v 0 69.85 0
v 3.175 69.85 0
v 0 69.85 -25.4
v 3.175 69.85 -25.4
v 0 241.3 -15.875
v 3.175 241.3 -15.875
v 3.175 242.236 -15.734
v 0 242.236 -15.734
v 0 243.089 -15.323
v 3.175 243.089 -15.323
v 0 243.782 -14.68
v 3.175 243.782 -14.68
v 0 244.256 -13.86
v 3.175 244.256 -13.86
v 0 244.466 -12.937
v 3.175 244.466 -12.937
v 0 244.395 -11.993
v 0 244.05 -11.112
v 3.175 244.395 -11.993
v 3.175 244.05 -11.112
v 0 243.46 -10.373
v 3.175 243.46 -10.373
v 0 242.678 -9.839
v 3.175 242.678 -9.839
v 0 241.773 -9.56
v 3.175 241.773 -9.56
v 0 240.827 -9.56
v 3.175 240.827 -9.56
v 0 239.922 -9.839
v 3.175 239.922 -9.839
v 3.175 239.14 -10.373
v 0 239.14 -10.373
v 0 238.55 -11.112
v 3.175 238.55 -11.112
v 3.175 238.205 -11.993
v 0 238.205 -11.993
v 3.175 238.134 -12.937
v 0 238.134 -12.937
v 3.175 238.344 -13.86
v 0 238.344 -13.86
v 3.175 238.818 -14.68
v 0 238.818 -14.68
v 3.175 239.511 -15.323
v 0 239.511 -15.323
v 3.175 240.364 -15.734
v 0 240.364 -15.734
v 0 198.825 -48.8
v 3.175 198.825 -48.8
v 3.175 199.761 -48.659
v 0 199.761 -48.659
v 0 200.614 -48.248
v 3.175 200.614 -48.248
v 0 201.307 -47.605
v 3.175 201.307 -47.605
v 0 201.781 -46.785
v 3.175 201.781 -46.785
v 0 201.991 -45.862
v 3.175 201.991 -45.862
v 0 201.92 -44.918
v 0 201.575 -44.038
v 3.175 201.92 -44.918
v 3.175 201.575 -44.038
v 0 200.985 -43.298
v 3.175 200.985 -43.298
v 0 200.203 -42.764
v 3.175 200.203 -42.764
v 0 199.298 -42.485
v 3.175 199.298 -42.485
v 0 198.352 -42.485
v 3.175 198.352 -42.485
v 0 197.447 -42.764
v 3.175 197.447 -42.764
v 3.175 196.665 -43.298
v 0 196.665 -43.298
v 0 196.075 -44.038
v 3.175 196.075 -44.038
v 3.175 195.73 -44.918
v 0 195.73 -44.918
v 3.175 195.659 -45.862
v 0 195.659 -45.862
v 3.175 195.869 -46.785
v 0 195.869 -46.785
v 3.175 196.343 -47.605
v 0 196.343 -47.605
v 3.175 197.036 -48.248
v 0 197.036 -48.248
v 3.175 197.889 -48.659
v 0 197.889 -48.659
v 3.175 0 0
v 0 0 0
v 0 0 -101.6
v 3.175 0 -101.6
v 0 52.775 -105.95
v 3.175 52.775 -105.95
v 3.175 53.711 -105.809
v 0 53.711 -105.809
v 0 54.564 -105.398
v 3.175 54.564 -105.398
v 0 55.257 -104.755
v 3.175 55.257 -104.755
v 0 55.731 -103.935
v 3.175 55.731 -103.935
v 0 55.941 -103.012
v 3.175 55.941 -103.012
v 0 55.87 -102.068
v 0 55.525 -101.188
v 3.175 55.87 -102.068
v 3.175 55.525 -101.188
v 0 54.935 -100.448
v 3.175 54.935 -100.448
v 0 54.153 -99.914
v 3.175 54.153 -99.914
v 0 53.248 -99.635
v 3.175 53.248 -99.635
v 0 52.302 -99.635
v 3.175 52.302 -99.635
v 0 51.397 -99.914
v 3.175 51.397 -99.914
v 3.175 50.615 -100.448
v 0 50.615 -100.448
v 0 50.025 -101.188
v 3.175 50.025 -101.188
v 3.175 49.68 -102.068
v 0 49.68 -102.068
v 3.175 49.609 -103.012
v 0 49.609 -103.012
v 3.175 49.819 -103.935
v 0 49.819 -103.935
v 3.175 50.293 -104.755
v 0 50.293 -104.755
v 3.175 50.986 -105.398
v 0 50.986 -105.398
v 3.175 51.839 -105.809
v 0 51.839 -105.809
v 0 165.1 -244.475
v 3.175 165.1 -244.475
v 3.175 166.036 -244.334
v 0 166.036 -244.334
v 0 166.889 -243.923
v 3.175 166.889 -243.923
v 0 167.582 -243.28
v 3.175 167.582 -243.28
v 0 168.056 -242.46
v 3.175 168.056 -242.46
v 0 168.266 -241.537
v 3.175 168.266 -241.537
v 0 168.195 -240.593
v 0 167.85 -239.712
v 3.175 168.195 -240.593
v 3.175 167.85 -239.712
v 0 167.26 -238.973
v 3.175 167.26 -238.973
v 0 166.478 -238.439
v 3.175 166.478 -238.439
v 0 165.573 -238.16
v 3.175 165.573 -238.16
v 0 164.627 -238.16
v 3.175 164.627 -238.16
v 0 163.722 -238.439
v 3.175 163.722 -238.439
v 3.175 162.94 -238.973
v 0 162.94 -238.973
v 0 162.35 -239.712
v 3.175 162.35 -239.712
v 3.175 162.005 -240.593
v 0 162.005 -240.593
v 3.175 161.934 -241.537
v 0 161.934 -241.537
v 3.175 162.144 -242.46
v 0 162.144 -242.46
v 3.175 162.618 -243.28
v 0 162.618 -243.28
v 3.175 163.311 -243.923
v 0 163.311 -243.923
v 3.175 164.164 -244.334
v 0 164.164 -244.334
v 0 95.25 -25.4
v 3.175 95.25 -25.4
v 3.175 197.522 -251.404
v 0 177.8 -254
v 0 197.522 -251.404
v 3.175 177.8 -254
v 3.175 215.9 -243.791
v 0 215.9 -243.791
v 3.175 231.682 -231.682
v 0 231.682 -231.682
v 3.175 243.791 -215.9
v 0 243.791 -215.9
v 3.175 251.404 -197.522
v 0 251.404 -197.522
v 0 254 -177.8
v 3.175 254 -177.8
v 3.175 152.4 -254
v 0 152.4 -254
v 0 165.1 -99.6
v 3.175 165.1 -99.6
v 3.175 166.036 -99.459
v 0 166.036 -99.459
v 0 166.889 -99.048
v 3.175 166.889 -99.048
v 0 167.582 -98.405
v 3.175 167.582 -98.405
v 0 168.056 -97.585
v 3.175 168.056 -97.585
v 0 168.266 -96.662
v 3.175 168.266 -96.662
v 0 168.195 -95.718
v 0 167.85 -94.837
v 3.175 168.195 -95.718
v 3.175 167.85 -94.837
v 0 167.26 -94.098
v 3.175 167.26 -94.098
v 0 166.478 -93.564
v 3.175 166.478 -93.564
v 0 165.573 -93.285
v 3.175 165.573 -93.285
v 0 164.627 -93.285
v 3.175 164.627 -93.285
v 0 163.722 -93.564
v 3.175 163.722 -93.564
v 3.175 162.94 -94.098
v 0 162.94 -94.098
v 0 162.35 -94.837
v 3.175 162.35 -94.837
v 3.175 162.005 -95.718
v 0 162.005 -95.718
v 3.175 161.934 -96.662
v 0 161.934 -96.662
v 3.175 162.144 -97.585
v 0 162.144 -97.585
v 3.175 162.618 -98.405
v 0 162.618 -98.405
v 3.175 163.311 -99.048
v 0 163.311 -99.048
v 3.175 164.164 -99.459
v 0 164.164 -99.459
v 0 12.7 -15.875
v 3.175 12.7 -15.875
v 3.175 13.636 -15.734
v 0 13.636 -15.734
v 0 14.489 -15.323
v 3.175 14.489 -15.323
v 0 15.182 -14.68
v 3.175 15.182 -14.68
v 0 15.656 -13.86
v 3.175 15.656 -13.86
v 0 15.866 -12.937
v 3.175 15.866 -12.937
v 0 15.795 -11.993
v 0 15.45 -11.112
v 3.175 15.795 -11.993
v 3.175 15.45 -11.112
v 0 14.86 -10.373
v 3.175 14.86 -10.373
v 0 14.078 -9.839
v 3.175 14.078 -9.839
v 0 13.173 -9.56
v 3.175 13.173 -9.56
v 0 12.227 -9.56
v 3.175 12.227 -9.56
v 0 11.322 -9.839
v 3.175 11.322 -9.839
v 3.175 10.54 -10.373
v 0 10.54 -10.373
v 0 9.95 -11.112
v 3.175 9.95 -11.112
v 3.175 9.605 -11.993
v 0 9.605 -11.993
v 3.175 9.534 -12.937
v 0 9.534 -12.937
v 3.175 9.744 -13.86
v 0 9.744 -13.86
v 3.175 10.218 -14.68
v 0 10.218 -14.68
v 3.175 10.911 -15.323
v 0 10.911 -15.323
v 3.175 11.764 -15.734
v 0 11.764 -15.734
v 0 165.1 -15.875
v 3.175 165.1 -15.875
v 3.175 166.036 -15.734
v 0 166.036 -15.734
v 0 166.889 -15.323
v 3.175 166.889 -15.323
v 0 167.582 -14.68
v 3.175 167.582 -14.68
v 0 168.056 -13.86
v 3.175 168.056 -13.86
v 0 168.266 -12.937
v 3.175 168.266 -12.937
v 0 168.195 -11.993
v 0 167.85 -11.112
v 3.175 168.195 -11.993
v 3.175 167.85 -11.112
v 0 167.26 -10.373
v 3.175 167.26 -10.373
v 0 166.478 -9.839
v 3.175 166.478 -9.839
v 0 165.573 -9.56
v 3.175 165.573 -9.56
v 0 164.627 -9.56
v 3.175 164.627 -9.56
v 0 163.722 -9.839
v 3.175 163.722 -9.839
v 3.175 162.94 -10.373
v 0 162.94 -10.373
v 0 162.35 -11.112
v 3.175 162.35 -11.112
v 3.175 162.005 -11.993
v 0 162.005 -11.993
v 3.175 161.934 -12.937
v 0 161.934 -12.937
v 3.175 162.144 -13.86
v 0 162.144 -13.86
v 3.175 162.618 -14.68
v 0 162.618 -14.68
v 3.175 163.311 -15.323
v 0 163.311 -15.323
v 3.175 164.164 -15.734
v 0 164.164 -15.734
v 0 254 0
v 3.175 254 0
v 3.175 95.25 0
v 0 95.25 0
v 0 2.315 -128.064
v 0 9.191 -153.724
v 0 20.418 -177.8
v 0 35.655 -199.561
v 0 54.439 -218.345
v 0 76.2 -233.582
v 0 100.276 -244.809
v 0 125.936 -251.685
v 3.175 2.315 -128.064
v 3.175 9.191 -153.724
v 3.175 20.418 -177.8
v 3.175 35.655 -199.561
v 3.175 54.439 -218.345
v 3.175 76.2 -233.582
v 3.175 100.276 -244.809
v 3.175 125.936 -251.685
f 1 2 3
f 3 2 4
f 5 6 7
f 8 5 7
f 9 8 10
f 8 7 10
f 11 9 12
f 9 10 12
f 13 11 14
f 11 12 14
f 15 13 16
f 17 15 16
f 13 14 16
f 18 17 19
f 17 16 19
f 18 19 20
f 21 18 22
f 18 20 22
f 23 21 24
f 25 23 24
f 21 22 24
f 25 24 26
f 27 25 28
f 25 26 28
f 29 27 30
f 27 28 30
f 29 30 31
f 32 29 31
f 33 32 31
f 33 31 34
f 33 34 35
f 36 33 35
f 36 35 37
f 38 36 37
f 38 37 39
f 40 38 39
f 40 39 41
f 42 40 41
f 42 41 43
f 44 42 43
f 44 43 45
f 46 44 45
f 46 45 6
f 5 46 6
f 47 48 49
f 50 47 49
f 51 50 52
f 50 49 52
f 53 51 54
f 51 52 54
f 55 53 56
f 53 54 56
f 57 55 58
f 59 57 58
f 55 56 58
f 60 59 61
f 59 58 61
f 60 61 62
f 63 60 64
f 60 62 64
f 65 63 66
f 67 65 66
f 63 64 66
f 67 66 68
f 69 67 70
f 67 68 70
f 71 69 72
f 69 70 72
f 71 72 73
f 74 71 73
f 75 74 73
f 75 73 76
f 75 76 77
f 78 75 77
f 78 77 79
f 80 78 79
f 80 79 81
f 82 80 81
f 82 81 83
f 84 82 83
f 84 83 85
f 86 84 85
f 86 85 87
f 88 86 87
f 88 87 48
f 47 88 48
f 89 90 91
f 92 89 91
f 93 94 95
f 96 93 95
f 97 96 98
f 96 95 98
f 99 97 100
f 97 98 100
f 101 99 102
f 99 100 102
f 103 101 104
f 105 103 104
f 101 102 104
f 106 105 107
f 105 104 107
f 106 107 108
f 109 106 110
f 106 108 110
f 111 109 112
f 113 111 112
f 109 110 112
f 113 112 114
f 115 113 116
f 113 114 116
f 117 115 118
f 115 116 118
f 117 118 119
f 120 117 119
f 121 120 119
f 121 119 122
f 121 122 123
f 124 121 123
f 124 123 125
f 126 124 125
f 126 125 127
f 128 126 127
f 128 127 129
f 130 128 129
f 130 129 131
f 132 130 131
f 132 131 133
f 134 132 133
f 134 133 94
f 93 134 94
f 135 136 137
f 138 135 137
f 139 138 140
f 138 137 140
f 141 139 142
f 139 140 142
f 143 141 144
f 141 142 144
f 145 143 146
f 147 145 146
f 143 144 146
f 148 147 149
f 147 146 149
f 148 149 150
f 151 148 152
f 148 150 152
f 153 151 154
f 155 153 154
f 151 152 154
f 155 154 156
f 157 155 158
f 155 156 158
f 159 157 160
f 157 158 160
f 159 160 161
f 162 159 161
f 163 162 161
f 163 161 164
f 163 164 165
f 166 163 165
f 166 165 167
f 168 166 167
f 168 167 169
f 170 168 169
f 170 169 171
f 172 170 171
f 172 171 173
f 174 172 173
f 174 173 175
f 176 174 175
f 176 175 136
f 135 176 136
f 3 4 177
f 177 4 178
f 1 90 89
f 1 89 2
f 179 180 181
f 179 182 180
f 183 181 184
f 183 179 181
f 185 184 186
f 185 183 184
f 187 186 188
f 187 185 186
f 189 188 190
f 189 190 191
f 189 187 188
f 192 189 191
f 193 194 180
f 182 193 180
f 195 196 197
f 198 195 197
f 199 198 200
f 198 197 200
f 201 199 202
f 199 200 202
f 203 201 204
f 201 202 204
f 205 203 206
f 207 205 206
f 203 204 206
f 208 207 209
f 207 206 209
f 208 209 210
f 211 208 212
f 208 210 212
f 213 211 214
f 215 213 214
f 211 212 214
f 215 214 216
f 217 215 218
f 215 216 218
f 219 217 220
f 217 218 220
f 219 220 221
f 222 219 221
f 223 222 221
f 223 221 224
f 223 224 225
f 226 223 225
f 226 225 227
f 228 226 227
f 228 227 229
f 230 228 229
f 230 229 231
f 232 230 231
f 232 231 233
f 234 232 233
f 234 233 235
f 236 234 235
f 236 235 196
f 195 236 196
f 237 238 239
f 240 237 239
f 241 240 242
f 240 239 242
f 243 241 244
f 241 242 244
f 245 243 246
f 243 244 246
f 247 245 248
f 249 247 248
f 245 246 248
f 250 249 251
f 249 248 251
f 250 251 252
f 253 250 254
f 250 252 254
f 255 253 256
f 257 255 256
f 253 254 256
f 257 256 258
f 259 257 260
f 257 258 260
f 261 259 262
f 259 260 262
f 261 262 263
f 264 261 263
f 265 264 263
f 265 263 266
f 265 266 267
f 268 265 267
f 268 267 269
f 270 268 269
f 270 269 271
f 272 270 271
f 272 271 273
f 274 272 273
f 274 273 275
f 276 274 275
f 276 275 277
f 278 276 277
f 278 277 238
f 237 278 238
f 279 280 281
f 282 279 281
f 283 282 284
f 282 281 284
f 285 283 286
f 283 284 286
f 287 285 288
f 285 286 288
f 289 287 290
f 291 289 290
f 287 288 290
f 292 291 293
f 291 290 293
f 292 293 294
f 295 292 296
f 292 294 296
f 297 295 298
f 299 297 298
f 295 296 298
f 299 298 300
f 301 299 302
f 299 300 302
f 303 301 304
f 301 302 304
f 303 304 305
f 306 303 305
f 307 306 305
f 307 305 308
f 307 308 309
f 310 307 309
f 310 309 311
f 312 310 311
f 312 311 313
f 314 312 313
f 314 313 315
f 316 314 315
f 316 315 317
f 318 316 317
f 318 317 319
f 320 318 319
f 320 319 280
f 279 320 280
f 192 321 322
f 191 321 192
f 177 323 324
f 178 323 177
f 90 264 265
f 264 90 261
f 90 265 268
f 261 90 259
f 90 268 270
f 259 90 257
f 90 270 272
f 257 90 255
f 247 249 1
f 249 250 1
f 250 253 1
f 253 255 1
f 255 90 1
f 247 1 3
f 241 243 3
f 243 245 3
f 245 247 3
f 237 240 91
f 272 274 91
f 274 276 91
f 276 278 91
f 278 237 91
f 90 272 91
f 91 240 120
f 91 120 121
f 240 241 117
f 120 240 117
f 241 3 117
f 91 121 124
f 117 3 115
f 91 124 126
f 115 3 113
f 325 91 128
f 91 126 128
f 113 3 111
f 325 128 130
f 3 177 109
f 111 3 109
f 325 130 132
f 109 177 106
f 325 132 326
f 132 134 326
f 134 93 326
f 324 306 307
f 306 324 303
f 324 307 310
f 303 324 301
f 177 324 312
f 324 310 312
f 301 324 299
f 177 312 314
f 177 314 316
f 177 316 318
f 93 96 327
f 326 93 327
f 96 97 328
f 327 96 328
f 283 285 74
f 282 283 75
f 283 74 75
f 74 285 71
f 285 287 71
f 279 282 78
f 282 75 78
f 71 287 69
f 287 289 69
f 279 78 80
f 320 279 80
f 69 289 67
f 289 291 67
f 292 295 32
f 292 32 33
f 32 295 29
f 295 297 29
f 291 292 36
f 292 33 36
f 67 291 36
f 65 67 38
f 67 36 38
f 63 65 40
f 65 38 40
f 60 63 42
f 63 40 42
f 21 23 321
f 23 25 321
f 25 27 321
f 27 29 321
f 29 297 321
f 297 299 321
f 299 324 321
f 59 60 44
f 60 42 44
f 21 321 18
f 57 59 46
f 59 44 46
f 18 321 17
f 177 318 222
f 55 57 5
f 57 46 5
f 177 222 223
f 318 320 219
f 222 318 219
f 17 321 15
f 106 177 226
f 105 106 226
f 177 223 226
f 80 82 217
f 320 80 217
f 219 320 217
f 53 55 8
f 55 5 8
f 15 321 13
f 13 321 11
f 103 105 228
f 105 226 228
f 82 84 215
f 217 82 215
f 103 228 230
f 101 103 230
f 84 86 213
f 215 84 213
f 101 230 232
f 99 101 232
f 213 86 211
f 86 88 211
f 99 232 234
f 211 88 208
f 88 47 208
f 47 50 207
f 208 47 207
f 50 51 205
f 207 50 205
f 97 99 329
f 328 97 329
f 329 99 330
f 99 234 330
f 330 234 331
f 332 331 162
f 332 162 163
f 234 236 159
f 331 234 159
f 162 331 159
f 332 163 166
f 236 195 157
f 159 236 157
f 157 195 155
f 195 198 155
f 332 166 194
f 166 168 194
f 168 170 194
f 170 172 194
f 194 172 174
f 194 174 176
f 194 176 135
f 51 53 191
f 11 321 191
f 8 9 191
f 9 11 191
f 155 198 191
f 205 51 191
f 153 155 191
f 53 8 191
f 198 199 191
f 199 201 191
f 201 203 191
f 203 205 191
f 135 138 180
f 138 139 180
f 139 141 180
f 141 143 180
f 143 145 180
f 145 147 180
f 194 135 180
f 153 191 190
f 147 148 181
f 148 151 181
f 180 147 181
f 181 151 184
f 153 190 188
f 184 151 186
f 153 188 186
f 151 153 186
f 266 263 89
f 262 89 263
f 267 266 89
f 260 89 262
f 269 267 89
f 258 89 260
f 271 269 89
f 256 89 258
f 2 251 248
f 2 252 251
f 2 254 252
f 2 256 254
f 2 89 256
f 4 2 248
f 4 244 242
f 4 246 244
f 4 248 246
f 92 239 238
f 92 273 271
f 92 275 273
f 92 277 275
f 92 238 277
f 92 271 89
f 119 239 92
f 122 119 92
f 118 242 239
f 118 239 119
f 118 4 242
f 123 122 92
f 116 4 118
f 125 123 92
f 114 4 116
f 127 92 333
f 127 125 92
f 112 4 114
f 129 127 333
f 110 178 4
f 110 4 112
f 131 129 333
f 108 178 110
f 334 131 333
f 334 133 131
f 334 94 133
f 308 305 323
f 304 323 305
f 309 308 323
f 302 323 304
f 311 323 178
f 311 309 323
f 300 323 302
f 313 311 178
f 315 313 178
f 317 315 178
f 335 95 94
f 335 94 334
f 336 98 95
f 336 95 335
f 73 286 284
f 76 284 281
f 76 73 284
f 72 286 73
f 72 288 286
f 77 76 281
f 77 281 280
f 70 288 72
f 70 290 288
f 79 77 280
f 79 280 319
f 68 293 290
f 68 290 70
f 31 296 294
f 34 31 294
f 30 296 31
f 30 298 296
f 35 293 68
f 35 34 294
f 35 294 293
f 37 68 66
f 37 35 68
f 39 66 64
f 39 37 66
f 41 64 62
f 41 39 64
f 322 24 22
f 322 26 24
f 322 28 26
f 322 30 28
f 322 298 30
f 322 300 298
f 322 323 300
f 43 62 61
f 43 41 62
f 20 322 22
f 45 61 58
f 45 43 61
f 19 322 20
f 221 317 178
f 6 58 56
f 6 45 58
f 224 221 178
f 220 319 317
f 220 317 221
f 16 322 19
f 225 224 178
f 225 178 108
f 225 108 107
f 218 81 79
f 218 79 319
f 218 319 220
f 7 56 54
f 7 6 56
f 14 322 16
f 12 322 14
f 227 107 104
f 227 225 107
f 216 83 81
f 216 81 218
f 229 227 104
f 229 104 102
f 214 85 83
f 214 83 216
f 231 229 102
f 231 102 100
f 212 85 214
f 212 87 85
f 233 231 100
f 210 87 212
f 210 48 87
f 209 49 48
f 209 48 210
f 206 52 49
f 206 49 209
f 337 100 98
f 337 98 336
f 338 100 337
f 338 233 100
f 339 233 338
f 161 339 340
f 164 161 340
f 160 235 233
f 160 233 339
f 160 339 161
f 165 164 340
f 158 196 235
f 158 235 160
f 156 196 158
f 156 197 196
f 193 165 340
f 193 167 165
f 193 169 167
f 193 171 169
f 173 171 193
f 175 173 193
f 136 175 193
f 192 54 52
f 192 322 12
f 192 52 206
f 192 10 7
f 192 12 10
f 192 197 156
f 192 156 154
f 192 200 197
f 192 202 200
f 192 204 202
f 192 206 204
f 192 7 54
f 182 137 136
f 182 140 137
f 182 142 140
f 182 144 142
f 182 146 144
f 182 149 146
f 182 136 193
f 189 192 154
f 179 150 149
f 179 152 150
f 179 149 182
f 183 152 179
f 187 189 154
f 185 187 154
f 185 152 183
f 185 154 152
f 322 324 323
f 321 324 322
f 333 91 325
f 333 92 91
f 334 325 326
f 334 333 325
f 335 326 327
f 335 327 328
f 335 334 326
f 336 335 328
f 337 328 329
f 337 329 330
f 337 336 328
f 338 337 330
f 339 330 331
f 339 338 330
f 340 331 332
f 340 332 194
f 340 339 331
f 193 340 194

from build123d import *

# Parameters (mm, degrees)
SKETCH1_W           = 254
SKETCH1_H           = 254
BOSS_EXTRUDE1_DEPTH = 3.175
SKETCH2_R           = 3.175
SKETCH2_W           = 25.4
SKETCH2_H           = 25.4
CUT_EXTRUDE1_DEPTH  = 4.175
FILLET1_R           = 152.4
FILLET2_R           = 76.2


with BuildPart() as part:
    # Sketch1 → Boss-Extrude1 (new body)
    with BuildSketch(Plane(origin=(0, 0, 0), x_dir=(0, 0, -1), z_dir=(1, 0, 0))):
        with Locations((127, 127)):
            Rectangle(SKETCH1_W, SKETCH1_H)
    extrude(amount=BOSS_EXTRUDE1_DEPTH)

    # Sketch2 → Cut-Extrude1 (cut, through all)
    with BuildSketch(Plane(origin=(3.175, 0, 0), x_dir=(0, 0, -1), z_dir=(1, 0, 0))):
        with Locations((102.775, 52.775)):
            Circle(SKETCH2_R)
        with Locations((96.425, 165.10000014)):
            Circle(SKETCH2_R)
        with Locations((45.625, 198.825)):
            Circle(SKETCH2_R)
        with Locations((12.7, 165.1)):
            Circle(SKETCH2_R)
        with Locations((12.7, 241.3)):
            Circle(SKETCH2_R)
        with Locations((12.7, 12.7)):
            Circle(SKETCH2_R)
        with Locations((241.3, 165.1)):
            Circle(SKETCH2_R)
        with Locations((12.7, 82.55)):
            Rectangle(SKETCH2_W, SKETCH2_H)
    extrude(amount=-CUT_EXTRUDE1_DEPTH, mode=Mode.SUBTRACT)

    # Fillet1
    fillet1_edges = [part.edges().sort_by_distance(p)[0] for p in [
        (1.5875, 0, -254),
    ]]
    fillet(fillet1_edges, radius=FILLET1_R)

    # Fillet2
    fillet2_edges = [part.edges().sort_by_distance(p)[0] for p in [
        (1.5875, 254, -254),
    ]]
    fillet(fillet2_edges, radius=FILLET2_R)


solid = part.part
